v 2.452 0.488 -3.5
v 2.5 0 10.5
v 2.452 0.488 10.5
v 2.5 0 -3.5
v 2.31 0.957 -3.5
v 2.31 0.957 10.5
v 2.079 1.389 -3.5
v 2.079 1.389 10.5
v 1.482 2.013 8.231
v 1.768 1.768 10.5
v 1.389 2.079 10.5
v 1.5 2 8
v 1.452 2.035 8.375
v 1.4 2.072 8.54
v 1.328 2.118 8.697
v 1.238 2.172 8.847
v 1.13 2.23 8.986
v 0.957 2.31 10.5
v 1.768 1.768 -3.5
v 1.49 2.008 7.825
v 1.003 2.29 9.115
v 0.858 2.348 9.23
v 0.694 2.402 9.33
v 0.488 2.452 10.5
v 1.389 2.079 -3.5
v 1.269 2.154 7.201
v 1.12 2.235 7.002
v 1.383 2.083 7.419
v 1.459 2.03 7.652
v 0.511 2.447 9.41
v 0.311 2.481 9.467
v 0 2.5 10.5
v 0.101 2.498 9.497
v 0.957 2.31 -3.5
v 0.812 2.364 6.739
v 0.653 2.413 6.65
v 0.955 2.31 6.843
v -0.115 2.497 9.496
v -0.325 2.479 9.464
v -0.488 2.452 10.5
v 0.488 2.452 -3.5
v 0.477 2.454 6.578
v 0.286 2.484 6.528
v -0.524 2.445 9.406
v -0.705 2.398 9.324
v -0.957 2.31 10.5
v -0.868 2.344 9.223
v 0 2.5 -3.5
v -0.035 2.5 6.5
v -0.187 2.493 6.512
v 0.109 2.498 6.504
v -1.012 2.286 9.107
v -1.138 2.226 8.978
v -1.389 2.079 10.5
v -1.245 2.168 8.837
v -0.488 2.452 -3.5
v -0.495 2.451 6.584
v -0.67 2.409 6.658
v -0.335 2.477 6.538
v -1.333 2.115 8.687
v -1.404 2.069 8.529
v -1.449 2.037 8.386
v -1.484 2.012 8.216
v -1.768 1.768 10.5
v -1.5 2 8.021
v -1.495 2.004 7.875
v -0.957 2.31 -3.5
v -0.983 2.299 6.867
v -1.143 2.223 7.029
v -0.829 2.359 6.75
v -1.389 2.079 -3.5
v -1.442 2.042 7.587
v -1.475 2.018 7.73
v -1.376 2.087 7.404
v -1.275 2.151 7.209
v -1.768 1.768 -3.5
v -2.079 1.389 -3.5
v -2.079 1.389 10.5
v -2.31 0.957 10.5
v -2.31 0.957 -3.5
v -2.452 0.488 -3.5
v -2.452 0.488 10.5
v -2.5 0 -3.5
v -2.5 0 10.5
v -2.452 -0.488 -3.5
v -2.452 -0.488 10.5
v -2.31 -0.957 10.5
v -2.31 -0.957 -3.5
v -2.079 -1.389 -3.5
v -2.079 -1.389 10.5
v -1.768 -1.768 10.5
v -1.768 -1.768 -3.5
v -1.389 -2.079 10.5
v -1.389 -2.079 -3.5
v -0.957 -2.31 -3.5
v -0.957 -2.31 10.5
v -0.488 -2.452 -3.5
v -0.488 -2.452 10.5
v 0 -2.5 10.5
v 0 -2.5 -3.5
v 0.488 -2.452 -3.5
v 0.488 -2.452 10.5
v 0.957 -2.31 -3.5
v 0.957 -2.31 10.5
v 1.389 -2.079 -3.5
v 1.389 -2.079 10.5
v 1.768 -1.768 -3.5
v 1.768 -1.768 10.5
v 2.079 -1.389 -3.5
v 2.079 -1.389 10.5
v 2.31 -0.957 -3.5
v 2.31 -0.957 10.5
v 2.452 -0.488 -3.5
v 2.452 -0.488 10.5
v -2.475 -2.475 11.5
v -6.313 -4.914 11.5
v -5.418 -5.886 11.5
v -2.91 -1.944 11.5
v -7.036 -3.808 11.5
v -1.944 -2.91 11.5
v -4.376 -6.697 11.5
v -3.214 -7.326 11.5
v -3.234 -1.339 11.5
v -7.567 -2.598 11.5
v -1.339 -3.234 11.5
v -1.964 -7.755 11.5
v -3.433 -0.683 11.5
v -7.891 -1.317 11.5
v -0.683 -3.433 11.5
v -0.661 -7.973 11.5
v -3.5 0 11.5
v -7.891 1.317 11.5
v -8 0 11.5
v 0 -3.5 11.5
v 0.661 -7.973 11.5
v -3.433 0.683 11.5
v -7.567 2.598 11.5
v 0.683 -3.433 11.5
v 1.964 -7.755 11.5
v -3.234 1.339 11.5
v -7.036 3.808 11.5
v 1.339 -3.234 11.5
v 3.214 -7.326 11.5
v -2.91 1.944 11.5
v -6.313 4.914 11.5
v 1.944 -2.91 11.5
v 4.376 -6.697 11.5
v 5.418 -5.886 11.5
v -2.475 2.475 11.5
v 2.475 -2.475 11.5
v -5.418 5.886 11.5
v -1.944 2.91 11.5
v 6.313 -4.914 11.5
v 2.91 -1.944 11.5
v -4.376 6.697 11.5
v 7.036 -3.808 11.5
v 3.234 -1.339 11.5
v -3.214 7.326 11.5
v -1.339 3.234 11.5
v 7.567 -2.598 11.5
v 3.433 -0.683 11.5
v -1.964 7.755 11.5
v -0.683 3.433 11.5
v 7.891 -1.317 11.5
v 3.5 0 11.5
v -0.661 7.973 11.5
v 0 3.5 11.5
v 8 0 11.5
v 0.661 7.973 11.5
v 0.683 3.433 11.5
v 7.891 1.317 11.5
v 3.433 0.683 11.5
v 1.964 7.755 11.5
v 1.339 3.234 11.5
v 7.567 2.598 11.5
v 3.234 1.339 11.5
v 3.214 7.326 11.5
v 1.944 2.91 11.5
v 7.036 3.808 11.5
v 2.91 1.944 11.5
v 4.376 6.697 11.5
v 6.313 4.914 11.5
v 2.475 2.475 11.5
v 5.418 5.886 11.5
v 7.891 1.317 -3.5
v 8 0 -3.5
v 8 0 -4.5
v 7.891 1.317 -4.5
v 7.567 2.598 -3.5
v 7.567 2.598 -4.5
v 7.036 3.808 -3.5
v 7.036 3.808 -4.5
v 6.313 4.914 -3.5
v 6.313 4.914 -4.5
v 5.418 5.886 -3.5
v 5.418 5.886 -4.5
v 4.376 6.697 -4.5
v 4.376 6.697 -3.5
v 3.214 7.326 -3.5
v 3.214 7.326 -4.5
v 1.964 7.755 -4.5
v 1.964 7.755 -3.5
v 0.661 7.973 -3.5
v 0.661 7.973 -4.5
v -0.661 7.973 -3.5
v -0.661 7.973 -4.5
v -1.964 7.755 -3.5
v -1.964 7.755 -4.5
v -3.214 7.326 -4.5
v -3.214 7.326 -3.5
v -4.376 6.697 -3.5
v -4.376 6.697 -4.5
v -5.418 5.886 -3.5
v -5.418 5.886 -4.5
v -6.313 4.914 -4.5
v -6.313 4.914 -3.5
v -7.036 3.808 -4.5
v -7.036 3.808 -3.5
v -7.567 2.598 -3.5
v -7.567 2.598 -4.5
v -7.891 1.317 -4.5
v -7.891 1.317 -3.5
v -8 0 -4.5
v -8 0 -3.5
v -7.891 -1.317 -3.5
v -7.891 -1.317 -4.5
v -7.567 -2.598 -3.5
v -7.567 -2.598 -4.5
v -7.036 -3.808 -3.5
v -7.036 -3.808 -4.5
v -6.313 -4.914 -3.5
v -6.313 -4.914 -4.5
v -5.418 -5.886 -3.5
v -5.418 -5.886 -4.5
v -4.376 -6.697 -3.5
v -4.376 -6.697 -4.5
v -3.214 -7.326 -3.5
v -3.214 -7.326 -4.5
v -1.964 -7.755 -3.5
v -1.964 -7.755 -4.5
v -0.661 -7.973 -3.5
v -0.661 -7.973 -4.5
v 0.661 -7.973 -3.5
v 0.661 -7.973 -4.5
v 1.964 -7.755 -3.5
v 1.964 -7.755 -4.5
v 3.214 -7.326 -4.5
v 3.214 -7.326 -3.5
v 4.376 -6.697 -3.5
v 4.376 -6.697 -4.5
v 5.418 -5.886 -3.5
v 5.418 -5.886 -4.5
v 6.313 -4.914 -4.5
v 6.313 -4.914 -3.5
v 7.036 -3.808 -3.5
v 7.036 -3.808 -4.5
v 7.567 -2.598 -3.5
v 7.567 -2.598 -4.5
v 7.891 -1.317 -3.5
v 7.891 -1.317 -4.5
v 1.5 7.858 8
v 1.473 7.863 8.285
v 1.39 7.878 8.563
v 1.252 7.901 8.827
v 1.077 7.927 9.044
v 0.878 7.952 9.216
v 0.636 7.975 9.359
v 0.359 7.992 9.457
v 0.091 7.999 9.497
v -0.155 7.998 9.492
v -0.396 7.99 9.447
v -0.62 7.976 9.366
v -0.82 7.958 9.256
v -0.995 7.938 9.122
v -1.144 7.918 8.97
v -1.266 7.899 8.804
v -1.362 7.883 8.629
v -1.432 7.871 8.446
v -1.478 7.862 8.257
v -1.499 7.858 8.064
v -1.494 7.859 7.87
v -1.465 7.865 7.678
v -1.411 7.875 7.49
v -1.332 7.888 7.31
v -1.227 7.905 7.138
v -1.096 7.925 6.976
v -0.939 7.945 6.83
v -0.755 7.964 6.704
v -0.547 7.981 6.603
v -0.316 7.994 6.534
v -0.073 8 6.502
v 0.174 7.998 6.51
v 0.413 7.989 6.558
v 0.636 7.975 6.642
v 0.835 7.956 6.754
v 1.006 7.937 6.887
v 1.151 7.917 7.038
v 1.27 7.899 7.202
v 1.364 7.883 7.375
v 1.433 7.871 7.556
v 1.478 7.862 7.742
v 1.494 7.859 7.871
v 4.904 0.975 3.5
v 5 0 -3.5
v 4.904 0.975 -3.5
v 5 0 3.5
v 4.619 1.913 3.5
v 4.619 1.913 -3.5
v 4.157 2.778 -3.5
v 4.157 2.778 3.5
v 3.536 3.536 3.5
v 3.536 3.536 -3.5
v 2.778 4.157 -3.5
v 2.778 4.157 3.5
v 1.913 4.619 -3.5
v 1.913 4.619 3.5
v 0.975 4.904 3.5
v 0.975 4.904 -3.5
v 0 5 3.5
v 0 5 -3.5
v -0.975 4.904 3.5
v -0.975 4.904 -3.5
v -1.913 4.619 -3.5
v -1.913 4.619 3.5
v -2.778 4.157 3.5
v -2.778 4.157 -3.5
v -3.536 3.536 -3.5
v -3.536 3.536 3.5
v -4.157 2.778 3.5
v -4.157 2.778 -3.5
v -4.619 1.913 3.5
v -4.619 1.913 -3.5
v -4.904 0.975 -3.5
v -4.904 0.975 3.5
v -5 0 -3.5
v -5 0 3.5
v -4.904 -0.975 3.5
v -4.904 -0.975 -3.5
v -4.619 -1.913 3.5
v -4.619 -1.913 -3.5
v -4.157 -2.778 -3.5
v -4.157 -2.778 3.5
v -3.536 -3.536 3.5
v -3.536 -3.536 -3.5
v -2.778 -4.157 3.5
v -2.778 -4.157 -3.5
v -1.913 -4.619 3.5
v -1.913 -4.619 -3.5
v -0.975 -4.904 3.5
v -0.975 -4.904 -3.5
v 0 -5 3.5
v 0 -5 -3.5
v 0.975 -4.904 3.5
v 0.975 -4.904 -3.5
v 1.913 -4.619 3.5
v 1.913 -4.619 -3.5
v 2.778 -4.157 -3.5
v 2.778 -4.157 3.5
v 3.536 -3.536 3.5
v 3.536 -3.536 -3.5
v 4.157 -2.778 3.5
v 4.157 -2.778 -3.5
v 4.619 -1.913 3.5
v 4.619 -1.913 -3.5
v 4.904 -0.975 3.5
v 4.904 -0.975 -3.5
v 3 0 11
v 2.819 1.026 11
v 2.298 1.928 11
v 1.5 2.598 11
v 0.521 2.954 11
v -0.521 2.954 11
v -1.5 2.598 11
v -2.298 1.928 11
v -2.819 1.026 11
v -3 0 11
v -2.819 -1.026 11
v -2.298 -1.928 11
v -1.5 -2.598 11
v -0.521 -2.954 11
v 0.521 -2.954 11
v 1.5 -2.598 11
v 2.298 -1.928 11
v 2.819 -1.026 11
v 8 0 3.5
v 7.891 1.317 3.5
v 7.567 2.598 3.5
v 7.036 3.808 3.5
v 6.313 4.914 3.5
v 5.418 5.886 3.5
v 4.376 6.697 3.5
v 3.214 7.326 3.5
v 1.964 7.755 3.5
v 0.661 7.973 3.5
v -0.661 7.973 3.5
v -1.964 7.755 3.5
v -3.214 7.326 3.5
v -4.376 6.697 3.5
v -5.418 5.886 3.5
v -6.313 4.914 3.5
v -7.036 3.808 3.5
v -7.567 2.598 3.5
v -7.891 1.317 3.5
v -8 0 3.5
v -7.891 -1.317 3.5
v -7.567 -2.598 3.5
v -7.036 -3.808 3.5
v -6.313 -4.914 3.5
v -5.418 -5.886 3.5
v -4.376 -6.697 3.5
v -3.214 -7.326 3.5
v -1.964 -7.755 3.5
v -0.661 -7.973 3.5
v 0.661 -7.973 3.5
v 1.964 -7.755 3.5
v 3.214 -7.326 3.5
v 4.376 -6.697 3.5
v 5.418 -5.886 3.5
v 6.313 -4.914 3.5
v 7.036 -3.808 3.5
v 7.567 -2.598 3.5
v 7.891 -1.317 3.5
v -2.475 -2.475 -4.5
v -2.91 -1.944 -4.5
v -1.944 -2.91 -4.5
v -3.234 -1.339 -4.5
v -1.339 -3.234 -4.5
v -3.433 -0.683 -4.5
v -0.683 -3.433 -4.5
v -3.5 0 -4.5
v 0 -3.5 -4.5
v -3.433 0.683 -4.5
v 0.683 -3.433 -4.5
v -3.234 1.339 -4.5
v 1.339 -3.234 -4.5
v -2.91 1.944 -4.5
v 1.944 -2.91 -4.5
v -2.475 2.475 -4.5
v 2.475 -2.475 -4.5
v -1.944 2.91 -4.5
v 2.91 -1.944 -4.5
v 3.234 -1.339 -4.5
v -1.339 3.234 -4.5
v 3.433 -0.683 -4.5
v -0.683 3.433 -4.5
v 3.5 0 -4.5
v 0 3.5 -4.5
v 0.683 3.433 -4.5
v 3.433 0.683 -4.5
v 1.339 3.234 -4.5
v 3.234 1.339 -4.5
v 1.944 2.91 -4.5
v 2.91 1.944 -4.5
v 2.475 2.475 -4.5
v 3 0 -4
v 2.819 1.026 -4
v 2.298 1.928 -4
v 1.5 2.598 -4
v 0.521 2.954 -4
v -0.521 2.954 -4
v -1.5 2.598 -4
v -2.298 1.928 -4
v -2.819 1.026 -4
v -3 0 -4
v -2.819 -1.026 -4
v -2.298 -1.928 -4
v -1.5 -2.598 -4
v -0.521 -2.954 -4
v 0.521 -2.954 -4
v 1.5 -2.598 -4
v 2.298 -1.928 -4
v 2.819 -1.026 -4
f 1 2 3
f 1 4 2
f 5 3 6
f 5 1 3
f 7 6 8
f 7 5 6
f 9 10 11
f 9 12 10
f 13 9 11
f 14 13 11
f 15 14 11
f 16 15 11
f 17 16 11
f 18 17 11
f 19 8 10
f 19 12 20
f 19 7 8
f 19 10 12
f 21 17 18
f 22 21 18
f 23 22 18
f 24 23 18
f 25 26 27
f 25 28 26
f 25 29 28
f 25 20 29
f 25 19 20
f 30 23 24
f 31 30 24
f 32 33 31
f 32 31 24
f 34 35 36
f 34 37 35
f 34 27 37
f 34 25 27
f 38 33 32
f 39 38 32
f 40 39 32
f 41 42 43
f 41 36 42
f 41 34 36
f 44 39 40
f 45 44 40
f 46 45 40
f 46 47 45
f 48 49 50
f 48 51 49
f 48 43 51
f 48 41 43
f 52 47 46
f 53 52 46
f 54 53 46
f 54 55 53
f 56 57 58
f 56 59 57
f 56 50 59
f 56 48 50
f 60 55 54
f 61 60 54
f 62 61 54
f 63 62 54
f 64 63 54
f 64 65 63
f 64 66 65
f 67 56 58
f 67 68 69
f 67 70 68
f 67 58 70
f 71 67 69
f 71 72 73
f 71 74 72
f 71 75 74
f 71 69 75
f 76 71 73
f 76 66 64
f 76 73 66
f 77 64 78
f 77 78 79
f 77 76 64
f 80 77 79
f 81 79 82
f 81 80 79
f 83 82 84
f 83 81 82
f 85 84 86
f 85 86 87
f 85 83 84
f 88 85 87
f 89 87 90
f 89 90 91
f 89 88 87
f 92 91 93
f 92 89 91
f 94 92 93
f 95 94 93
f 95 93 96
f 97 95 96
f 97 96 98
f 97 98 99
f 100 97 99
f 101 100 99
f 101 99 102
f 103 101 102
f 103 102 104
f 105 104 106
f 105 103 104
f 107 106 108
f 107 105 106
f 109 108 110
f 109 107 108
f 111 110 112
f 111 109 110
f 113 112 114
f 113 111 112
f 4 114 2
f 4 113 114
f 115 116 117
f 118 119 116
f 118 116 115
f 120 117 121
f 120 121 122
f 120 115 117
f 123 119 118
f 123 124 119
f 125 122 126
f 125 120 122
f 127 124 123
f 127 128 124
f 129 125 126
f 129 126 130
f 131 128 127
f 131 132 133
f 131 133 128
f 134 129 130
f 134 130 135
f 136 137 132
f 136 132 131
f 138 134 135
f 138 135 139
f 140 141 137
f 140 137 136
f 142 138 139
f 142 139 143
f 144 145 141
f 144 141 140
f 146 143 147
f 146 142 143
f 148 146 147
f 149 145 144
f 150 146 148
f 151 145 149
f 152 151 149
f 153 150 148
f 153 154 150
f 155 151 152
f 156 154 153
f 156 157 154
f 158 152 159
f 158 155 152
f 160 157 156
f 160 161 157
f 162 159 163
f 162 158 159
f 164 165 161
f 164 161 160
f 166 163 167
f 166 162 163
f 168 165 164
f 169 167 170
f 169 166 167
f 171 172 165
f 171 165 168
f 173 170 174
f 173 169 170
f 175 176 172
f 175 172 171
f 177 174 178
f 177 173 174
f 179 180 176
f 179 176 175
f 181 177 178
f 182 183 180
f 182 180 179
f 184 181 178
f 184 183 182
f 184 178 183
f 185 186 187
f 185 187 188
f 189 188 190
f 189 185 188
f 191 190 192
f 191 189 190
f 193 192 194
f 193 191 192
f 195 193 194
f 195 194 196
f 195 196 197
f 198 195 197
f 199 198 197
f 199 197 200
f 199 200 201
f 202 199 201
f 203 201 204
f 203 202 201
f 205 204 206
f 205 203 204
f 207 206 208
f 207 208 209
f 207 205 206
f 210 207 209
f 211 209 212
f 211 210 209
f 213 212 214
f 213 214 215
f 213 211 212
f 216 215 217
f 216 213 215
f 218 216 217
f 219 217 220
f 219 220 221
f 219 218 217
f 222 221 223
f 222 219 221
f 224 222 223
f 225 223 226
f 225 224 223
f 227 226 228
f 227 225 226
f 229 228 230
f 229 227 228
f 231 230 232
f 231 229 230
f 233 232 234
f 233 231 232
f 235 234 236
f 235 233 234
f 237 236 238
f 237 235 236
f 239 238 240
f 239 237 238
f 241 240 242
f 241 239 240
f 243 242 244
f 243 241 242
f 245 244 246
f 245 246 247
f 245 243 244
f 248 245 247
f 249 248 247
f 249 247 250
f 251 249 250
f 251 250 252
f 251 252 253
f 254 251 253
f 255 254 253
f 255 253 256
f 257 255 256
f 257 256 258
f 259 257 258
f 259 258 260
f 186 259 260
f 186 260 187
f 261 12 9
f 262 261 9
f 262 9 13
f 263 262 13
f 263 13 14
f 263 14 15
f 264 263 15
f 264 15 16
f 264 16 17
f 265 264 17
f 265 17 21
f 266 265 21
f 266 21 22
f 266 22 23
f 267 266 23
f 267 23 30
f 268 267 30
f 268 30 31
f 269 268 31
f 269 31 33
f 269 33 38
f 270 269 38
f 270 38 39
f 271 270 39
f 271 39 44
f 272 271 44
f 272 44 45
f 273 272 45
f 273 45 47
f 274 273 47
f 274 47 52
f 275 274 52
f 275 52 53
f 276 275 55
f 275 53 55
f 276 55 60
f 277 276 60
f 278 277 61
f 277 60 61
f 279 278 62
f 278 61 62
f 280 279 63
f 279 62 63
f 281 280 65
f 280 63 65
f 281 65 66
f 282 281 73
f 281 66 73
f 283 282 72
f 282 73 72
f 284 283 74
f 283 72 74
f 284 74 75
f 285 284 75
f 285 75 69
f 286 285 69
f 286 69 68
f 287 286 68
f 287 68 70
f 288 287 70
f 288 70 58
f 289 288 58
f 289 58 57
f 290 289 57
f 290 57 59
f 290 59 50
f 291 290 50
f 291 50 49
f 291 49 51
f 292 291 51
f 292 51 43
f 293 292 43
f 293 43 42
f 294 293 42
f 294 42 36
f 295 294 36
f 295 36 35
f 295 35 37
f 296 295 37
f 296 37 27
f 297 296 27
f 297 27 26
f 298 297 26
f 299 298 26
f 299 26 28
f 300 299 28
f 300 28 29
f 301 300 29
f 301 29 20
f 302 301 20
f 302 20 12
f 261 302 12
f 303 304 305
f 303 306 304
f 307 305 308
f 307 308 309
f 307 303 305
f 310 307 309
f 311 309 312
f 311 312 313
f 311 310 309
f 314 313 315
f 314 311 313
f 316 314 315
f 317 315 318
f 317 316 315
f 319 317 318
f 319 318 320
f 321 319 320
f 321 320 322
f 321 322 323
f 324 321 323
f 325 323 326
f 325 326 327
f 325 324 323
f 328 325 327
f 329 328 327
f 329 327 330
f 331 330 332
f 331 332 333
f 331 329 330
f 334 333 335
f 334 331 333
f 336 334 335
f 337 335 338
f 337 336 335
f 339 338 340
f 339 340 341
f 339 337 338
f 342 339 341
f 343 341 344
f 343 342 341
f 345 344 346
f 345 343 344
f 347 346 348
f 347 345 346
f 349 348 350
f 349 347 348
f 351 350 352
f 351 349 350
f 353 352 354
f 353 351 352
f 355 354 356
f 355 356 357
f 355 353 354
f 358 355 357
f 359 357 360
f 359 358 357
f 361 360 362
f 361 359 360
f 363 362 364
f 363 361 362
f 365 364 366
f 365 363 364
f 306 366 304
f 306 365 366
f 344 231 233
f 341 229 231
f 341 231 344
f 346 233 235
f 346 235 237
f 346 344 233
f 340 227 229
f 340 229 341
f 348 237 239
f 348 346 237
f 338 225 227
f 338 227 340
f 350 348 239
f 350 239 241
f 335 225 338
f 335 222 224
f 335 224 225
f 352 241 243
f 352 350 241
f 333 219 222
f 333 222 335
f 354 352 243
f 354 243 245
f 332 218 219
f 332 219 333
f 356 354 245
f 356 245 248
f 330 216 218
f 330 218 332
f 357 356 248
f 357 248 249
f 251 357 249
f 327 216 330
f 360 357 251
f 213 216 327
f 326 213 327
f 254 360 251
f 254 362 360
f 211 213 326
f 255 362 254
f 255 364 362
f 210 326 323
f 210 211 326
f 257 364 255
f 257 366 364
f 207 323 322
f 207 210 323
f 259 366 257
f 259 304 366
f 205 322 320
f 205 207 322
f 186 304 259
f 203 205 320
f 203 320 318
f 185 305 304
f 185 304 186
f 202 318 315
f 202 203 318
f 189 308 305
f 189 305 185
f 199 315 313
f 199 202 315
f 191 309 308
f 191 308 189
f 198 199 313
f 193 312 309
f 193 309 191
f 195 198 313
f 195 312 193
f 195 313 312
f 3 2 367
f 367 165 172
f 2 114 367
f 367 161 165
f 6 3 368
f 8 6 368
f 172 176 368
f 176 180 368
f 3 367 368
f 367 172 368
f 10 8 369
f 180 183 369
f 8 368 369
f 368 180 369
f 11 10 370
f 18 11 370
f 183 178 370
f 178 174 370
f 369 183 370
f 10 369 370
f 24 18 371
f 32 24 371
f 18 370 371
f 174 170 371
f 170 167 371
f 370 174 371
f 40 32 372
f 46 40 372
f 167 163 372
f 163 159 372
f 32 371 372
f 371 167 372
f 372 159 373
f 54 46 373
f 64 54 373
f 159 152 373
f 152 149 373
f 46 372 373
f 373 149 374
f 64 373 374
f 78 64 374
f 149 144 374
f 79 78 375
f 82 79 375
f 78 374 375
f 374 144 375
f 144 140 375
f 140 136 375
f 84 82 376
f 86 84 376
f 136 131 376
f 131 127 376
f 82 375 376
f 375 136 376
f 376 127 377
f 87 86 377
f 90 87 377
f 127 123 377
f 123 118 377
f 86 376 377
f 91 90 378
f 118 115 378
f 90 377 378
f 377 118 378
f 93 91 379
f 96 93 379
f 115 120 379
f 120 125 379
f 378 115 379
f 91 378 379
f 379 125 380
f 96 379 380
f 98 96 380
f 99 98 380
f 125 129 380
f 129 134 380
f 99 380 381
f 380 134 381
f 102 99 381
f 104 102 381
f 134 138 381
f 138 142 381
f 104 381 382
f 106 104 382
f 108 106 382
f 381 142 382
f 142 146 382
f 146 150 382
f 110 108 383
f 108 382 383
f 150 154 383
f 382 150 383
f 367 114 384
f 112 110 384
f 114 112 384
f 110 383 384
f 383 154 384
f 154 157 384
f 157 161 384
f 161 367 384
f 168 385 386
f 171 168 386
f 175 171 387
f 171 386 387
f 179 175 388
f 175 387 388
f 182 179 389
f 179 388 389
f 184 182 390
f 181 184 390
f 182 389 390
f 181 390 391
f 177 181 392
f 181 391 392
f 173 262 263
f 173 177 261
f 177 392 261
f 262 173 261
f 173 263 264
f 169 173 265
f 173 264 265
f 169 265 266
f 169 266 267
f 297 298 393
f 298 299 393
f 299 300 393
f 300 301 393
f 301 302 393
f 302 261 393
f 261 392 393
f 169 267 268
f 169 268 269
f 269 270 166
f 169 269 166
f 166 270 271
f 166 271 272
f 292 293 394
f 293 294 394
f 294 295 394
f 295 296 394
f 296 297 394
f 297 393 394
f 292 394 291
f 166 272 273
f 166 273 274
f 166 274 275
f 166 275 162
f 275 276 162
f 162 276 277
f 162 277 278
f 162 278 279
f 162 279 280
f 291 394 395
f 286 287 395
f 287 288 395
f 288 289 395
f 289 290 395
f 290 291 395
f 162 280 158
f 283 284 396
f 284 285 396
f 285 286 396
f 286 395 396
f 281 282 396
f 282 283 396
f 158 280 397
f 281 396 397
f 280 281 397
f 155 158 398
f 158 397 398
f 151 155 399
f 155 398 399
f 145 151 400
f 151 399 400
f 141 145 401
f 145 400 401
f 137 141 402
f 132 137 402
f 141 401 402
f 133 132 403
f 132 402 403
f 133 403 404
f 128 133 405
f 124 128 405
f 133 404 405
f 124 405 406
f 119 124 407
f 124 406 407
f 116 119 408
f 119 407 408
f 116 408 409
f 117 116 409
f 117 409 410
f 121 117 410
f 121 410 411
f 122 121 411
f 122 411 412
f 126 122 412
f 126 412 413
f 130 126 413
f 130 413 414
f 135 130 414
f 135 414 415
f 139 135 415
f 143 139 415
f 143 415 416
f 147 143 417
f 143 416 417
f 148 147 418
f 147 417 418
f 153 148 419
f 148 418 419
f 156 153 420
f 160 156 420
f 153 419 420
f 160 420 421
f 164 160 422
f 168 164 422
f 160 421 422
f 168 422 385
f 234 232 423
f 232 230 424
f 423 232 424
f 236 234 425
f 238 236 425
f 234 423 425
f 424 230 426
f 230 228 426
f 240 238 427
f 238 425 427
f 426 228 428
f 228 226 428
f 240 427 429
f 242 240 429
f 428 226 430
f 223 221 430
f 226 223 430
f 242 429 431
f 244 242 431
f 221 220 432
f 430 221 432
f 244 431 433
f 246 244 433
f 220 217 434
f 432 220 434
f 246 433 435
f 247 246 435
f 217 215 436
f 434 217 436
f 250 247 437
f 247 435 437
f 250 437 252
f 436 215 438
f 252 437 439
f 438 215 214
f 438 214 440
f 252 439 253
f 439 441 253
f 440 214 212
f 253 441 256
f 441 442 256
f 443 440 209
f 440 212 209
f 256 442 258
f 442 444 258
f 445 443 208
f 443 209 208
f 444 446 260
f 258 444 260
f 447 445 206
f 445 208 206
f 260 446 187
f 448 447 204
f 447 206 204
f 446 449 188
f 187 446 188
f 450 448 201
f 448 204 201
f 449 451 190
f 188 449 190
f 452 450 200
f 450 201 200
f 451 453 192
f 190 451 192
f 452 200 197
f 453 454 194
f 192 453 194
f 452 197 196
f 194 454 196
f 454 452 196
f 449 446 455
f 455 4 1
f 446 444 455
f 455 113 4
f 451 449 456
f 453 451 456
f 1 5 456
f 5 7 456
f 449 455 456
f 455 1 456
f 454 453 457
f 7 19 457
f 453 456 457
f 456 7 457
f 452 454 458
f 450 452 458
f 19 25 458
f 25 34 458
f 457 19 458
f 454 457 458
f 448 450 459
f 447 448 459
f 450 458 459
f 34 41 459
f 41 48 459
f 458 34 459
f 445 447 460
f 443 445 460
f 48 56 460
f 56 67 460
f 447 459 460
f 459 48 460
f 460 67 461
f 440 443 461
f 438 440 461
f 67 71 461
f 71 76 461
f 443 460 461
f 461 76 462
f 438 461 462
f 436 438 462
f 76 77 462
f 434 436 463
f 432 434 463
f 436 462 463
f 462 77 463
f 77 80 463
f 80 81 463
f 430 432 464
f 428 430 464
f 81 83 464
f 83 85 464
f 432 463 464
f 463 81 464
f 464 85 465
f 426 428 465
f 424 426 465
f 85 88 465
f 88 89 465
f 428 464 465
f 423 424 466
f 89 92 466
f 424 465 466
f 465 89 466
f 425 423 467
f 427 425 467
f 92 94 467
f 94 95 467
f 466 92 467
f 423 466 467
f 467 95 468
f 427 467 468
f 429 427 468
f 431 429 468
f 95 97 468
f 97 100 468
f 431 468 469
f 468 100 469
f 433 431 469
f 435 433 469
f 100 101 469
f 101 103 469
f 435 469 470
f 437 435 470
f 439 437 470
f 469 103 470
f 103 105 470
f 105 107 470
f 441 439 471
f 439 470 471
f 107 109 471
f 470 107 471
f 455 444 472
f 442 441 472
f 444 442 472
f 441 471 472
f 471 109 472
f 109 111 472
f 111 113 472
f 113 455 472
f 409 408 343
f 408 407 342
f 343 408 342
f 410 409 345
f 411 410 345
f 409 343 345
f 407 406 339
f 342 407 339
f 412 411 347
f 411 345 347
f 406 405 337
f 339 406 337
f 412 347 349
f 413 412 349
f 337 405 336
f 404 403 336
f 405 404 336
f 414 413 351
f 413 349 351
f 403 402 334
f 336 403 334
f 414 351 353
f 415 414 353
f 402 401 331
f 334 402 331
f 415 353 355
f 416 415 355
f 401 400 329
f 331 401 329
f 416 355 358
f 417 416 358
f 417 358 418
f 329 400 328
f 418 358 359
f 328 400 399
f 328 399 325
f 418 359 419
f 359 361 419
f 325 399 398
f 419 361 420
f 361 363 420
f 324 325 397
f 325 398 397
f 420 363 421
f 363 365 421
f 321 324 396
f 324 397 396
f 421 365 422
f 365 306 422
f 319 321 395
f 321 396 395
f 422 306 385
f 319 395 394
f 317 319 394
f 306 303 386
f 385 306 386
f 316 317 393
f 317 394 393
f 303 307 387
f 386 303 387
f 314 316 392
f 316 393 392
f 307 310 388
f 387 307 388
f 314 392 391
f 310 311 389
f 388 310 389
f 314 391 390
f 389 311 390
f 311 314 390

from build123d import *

# Parameters (mm, degrees)
F0_R     = 5
F0_R_2   = 2.5
F1_DEPTH = 3.5
F2_R     = 8
F2_R_2   = 2.5
F3_DEPTH = 1
F5_R     = 8
F5_R_2   = 2.5
F6_DEPTH = 7
F7_SIZE  = 1
F8_R     = 1.5
F9_DEPTH = 8.001


# Not quite as in the source:
# - a feature names something its author has since deleted; it is built from what else it names


with BuildPart() as f1:
    # F0 (on Top) → F1 (new body, symmetric)
    with BuildSketch(Plane.XY):
        Circle(F0_R)
        Circle(F0_R_2, mode=Mode.SUBTRACT)
    extrude(amount=F1_DEPTH, both=True)

    # F2 (on face) → F3 (join)
    with BuildSketch(Plane.XY.offset(3.5)):
        Circle(F2_R)
        Circle(F2_R_2, mode=Mode.SUBTRACT)
    extrude(amount=F3_DEPTH)

    # F4: F1 across plane


with BuildPart() as f1_1:
    add(f1.part)
    add(f1.part.mirror(Plane.XY))

    # F5 (on face) → F6 (join)
    with BuildSketch(Plane.XY.offset(4.5)):
        Circle(F5_R)
        Circle(F5_R_2, mode=Mode.SUBTRACT)
    extrude(amount=F6_DEPTH)

    # F7
    f7_edges = [f1_1.edges().sort_by_distance(p)[0] for p in [
        (-2.5, 0, 11.5),
        (-2.5, 0, -4.5),
    ]]
    chamfer(f7_edges, length=F7_SIZE)

    # F8 (on Front) → F9 (cut, through all)
    with BuildSketch(Plane.XZ):
        with Locations((0, 8)):
            Circle(F8_R)
    extrude(amount=-F9_DEPTH, mode=Mode.SUBTRACT)


solid = f1_1.part
